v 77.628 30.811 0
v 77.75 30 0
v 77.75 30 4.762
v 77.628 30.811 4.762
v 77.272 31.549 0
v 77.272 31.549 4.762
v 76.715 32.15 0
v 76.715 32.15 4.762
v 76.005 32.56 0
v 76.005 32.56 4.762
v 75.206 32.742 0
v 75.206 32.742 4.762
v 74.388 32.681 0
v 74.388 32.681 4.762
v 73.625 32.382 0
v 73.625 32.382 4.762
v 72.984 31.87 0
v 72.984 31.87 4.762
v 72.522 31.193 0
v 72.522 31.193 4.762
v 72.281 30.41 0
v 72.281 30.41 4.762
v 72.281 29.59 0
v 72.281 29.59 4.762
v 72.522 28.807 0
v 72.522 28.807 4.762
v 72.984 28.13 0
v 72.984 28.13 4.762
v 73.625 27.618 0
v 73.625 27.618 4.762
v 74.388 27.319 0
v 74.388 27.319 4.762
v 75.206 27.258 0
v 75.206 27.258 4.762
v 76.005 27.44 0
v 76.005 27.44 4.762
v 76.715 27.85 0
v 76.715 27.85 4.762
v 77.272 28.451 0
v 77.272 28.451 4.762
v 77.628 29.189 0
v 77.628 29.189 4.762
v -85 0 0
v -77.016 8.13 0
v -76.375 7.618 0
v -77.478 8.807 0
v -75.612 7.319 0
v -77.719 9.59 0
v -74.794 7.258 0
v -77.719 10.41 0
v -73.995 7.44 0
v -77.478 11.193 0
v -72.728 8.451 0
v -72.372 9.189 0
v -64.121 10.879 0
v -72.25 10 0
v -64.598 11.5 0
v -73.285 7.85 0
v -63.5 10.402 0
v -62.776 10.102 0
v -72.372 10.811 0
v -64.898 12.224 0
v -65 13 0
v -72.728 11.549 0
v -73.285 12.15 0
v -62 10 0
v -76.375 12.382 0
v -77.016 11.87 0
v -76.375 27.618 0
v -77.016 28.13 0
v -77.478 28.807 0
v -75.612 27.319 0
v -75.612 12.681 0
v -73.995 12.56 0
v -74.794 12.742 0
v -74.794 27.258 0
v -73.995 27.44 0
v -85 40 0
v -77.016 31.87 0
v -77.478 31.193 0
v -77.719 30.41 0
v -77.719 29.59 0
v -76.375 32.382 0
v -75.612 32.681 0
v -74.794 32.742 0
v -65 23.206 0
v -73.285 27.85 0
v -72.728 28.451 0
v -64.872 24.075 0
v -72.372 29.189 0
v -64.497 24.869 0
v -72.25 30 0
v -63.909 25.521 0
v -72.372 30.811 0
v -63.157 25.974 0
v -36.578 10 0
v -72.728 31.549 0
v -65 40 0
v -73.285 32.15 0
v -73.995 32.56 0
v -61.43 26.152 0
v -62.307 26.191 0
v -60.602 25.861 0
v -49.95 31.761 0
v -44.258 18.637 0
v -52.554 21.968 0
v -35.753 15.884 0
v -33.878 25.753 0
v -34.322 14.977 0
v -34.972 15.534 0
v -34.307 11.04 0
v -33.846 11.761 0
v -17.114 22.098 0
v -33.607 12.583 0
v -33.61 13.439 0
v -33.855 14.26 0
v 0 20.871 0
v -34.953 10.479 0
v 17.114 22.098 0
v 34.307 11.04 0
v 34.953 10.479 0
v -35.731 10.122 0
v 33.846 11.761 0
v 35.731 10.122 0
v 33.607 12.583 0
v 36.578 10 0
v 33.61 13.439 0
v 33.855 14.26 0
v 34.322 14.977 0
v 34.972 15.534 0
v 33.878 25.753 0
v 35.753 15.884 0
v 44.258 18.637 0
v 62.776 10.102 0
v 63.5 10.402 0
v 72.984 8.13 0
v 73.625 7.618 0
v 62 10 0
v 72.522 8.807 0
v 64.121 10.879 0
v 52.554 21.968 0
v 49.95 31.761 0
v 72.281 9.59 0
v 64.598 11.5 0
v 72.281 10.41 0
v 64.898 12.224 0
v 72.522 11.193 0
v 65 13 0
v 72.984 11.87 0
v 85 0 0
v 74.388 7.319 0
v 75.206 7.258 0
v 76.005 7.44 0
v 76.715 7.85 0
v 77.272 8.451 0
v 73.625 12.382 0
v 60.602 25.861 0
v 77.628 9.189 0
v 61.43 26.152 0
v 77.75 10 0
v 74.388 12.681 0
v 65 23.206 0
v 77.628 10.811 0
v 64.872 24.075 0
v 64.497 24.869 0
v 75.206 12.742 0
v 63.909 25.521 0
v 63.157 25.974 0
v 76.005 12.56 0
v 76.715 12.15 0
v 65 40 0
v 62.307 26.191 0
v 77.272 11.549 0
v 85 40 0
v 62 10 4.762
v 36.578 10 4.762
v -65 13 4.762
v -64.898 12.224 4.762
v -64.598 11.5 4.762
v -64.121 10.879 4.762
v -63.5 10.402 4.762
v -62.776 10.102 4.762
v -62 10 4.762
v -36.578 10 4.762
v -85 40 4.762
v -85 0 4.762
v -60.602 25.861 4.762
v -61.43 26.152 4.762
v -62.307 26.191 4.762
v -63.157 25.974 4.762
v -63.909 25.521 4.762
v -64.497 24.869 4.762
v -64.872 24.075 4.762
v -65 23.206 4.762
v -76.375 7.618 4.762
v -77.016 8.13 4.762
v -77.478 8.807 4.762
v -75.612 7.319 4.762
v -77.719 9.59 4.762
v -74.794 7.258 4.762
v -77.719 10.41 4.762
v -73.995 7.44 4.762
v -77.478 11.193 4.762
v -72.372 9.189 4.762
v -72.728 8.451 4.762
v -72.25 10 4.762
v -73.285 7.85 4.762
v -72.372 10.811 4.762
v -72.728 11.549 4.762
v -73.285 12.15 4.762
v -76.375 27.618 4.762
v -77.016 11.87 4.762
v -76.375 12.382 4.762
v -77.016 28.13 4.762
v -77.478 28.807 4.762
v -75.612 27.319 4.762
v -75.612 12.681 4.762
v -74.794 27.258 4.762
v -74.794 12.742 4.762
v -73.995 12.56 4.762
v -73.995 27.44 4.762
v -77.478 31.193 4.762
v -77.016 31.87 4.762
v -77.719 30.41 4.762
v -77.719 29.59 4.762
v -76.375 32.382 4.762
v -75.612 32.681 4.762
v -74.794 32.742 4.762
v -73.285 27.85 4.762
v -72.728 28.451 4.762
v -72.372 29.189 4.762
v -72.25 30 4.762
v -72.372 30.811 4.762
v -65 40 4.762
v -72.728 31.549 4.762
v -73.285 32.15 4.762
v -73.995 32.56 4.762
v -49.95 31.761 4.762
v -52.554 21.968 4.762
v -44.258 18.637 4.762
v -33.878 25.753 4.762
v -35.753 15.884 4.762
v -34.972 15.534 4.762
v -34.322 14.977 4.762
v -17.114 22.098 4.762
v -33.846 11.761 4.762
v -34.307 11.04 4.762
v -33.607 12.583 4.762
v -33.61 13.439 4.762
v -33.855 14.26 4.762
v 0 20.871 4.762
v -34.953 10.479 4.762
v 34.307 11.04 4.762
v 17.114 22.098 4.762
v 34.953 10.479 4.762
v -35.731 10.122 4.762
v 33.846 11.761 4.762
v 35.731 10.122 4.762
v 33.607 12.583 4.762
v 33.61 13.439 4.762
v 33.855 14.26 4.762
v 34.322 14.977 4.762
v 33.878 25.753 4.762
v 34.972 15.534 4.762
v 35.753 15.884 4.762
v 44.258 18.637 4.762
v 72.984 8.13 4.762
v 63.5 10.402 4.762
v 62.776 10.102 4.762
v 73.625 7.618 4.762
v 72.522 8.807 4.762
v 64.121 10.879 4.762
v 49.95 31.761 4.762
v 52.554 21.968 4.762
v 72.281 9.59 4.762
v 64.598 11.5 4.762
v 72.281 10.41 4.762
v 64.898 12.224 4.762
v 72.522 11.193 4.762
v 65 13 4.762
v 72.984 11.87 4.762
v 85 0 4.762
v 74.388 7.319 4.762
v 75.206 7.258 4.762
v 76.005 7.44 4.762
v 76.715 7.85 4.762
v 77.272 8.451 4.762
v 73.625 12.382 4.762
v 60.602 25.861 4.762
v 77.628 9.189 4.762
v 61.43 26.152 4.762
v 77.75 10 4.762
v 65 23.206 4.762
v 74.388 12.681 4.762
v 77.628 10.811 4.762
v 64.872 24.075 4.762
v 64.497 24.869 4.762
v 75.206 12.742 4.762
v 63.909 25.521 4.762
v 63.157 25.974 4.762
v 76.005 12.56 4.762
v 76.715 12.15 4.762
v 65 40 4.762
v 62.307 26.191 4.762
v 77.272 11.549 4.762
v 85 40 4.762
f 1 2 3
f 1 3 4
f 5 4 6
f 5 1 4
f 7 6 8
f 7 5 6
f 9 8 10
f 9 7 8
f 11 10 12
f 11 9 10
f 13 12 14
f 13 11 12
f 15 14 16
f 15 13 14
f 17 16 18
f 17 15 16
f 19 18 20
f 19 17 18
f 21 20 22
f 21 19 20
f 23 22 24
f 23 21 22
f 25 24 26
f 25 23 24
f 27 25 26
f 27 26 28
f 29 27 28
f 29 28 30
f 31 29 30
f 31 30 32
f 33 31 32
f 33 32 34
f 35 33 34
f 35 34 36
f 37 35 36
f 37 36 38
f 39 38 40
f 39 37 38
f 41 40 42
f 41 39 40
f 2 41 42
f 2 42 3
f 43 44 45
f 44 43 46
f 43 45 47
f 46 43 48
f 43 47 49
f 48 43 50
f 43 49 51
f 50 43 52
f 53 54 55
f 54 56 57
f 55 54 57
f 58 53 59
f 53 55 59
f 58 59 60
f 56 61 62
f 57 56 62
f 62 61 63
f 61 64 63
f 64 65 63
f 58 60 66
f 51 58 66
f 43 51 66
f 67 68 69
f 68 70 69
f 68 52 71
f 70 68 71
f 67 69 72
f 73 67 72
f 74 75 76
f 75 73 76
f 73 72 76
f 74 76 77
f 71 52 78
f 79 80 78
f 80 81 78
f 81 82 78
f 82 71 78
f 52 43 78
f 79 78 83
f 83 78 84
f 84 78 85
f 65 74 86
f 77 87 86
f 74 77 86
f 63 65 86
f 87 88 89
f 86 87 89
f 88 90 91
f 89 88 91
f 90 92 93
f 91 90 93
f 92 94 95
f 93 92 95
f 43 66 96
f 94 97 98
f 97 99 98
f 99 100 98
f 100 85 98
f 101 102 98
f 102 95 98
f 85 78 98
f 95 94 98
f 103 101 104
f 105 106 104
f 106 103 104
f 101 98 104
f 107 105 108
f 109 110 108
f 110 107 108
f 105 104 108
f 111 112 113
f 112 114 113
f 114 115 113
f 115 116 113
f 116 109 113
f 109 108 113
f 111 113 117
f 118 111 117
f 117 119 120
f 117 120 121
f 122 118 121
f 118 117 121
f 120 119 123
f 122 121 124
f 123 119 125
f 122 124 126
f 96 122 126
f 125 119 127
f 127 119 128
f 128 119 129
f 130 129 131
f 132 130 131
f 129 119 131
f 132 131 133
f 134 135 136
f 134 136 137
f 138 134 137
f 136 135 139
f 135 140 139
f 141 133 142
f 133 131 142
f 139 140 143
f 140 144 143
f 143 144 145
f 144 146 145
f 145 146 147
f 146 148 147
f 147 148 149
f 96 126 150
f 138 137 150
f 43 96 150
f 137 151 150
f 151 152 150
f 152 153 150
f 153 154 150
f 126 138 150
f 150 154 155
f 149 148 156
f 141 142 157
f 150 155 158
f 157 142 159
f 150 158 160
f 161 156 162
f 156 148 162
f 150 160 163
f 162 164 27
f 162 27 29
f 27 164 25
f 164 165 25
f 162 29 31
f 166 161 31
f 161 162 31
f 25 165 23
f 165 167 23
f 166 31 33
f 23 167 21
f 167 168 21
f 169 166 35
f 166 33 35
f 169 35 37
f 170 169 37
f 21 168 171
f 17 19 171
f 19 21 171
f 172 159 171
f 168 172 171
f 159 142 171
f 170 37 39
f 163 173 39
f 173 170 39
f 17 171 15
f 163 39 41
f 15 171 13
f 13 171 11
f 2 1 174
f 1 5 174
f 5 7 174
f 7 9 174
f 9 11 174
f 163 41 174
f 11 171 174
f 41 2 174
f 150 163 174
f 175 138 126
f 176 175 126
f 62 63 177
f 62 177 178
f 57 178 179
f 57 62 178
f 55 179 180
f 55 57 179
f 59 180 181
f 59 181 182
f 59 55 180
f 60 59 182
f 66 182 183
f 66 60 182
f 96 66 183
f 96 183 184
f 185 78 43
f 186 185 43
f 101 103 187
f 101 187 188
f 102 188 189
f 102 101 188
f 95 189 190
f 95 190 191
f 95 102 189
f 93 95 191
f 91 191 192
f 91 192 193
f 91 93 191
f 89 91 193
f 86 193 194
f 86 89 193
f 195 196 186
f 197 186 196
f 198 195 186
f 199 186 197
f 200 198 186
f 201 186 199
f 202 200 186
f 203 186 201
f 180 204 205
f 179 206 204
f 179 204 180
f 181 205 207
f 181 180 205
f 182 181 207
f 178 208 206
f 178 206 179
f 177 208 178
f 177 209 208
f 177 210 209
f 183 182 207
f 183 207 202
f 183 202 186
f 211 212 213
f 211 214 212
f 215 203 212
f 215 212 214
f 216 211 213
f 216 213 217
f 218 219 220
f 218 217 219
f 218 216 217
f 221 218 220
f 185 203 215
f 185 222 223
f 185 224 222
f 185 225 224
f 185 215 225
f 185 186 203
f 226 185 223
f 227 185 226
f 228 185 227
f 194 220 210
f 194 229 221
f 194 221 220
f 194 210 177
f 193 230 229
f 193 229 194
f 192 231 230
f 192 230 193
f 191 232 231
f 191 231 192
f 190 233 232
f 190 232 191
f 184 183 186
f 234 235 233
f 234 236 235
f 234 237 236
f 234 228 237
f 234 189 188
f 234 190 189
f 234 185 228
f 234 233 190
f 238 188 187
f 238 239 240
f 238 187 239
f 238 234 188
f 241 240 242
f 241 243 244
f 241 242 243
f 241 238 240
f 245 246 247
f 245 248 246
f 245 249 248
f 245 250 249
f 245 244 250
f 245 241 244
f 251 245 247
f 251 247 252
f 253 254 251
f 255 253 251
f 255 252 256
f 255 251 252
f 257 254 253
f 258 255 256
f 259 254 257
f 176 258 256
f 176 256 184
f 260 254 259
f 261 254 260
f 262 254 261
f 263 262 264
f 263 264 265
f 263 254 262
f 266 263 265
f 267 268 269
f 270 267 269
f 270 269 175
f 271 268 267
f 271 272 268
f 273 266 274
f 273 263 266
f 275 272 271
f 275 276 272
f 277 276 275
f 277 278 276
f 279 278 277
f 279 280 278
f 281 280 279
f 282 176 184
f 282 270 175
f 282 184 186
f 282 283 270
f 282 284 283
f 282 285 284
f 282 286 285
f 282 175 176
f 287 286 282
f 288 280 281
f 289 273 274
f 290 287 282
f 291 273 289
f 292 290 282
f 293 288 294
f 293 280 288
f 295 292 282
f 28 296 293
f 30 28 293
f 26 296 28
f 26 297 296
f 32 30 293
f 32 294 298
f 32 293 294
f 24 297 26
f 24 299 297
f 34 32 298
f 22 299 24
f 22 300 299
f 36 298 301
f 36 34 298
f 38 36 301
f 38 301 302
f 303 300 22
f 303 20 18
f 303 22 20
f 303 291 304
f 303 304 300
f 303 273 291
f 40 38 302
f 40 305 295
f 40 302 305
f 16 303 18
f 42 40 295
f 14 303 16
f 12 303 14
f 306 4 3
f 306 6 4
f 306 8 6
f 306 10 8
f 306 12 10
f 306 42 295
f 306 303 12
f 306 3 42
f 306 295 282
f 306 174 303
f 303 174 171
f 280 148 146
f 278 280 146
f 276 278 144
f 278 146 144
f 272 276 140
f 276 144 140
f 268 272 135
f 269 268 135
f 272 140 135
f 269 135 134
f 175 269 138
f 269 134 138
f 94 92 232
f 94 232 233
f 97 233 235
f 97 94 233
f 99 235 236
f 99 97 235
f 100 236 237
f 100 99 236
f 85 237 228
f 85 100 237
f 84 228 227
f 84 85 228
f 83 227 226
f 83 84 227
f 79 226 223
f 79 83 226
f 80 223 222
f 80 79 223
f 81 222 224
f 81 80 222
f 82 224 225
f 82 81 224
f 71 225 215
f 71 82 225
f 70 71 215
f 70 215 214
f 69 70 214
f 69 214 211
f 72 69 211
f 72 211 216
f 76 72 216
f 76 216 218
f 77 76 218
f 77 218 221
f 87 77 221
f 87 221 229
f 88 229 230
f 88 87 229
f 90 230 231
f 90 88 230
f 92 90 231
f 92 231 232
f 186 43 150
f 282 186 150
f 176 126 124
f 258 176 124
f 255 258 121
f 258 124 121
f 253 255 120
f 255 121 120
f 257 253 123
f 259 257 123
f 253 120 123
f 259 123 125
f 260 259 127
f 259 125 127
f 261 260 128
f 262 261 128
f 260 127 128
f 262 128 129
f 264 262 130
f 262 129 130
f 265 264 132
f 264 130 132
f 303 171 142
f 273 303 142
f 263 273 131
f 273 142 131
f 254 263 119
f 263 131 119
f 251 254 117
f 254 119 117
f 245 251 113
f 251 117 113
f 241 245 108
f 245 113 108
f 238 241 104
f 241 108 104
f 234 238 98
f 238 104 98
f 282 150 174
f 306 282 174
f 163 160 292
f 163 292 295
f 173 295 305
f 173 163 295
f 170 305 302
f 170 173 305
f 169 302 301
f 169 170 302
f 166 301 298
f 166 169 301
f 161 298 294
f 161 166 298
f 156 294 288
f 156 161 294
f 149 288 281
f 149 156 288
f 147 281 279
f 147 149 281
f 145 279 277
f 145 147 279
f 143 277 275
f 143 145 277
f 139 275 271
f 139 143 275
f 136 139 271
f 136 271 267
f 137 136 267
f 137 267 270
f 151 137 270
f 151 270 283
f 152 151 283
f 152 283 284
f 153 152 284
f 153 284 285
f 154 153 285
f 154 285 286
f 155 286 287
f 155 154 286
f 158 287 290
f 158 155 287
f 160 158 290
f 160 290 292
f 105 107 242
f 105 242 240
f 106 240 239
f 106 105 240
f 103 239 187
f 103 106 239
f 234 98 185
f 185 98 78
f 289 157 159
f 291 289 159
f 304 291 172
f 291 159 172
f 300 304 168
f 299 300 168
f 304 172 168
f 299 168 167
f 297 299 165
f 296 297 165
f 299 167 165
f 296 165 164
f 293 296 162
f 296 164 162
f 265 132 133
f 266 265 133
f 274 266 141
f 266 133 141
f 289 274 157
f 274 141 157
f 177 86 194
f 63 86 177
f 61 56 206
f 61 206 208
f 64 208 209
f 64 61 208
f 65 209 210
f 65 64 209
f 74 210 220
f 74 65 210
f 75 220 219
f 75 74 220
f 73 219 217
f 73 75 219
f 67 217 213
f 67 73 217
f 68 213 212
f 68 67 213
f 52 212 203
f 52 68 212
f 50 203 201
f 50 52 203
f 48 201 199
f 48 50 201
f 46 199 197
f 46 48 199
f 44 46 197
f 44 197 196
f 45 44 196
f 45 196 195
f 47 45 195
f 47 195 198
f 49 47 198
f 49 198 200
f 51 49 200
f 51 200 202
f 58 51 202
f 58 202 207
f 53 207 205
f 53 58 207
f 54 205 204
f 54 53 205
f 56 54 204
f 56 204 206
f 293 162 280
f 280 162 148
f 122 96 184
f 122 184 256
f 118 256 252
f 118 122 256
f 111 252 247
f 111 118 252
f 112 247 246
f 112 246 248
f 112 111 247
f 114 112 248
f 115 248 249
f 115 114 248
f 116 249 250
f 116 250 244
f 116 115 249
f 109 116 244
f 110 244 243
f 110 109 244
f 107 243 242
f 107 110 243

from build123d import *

# Parameters (mm, degrees)
SKETCH1_R           = 2.75
BOSS_EXTRUDE1_DEPTH = 4.7625


with BuildPart() as part:
    # Sketch1 → Boss-Extrude1 (new body)
    with BuildSketch(Plane.XY):
        with BuildLine():
            Line((-85, 0), (85, 0))
            Line((85, 0), (85, 40))
            Line((85, 40), (65, 40))
            ThreePointArc((65, 40), (0, 20.871205009), (-65, 40))
            Line((-65, 40), (-85, 40))
            Line((-85, 40), (-85, 0))
        make_face()
        with Locations((-75, 30)):
            Circle(SKETCH1_R, mode=Mode.SUBTRACT)
        with Locations((-75, 10)):
            Circle(SKETCH1_R, mode=Mode.SUBTRACT)
        with Locations((75, 30)):
            Circle(SKETCH1_R, mode=Mode.SUBTRACT)
        with Locations((75, 10)):
            Circle(SKETCH1_R, mode=Mode.SUBTRACT)
        with BuildLine():
            Line((-65, 23.206426932), (-65, 13))
            ThreePointArc((-65, 13), (-64.121320344, 10.878679656), (-62, 10))
            Line((-62, 10), (-36.578066235, 10))
            ThreePointArc((-36.578066235, 10), (-33.607128783, 12.583429889), (-35.752997072, 15.884312895))
            ThreePointArc((-35.752997072, 15.884312895), (-48.434787426, 20.230949012), (-60.601503759, 25.86051967))
            ThreePointArc((-60.601503759, 25.86051967), (-63.549921172, 25.775034407), (-65, 23.206426932))
        make_face(mode=Mode.SUBTRACT)
        with BuildLine():
            Line((65, 23.206426932), (65, 13))
            ThreePointArc((65, 13), (64.121320344, 10.878679656), (62, 10))
            Line((62, 10), (36.578066235, 10))
            ThreePointArc((36.578066235, 10), (33.607128783, 12.583429889), (35.752997072, 15.884312895))
            ThreePointArc((35.752997072, 15.884312895), (48.434787426, 20.230949012), (60.601503759, 25.86051967))
            ThreePointArc((60.601503759, 25.86051967), (63.549921172, 25.775034407), (65, 23.206426932))
        make_face(mode=Mode.SUBTRACT)
    extrude(amount=BOSS_EXTRUDE1_DEPTH)


solid = part.part
